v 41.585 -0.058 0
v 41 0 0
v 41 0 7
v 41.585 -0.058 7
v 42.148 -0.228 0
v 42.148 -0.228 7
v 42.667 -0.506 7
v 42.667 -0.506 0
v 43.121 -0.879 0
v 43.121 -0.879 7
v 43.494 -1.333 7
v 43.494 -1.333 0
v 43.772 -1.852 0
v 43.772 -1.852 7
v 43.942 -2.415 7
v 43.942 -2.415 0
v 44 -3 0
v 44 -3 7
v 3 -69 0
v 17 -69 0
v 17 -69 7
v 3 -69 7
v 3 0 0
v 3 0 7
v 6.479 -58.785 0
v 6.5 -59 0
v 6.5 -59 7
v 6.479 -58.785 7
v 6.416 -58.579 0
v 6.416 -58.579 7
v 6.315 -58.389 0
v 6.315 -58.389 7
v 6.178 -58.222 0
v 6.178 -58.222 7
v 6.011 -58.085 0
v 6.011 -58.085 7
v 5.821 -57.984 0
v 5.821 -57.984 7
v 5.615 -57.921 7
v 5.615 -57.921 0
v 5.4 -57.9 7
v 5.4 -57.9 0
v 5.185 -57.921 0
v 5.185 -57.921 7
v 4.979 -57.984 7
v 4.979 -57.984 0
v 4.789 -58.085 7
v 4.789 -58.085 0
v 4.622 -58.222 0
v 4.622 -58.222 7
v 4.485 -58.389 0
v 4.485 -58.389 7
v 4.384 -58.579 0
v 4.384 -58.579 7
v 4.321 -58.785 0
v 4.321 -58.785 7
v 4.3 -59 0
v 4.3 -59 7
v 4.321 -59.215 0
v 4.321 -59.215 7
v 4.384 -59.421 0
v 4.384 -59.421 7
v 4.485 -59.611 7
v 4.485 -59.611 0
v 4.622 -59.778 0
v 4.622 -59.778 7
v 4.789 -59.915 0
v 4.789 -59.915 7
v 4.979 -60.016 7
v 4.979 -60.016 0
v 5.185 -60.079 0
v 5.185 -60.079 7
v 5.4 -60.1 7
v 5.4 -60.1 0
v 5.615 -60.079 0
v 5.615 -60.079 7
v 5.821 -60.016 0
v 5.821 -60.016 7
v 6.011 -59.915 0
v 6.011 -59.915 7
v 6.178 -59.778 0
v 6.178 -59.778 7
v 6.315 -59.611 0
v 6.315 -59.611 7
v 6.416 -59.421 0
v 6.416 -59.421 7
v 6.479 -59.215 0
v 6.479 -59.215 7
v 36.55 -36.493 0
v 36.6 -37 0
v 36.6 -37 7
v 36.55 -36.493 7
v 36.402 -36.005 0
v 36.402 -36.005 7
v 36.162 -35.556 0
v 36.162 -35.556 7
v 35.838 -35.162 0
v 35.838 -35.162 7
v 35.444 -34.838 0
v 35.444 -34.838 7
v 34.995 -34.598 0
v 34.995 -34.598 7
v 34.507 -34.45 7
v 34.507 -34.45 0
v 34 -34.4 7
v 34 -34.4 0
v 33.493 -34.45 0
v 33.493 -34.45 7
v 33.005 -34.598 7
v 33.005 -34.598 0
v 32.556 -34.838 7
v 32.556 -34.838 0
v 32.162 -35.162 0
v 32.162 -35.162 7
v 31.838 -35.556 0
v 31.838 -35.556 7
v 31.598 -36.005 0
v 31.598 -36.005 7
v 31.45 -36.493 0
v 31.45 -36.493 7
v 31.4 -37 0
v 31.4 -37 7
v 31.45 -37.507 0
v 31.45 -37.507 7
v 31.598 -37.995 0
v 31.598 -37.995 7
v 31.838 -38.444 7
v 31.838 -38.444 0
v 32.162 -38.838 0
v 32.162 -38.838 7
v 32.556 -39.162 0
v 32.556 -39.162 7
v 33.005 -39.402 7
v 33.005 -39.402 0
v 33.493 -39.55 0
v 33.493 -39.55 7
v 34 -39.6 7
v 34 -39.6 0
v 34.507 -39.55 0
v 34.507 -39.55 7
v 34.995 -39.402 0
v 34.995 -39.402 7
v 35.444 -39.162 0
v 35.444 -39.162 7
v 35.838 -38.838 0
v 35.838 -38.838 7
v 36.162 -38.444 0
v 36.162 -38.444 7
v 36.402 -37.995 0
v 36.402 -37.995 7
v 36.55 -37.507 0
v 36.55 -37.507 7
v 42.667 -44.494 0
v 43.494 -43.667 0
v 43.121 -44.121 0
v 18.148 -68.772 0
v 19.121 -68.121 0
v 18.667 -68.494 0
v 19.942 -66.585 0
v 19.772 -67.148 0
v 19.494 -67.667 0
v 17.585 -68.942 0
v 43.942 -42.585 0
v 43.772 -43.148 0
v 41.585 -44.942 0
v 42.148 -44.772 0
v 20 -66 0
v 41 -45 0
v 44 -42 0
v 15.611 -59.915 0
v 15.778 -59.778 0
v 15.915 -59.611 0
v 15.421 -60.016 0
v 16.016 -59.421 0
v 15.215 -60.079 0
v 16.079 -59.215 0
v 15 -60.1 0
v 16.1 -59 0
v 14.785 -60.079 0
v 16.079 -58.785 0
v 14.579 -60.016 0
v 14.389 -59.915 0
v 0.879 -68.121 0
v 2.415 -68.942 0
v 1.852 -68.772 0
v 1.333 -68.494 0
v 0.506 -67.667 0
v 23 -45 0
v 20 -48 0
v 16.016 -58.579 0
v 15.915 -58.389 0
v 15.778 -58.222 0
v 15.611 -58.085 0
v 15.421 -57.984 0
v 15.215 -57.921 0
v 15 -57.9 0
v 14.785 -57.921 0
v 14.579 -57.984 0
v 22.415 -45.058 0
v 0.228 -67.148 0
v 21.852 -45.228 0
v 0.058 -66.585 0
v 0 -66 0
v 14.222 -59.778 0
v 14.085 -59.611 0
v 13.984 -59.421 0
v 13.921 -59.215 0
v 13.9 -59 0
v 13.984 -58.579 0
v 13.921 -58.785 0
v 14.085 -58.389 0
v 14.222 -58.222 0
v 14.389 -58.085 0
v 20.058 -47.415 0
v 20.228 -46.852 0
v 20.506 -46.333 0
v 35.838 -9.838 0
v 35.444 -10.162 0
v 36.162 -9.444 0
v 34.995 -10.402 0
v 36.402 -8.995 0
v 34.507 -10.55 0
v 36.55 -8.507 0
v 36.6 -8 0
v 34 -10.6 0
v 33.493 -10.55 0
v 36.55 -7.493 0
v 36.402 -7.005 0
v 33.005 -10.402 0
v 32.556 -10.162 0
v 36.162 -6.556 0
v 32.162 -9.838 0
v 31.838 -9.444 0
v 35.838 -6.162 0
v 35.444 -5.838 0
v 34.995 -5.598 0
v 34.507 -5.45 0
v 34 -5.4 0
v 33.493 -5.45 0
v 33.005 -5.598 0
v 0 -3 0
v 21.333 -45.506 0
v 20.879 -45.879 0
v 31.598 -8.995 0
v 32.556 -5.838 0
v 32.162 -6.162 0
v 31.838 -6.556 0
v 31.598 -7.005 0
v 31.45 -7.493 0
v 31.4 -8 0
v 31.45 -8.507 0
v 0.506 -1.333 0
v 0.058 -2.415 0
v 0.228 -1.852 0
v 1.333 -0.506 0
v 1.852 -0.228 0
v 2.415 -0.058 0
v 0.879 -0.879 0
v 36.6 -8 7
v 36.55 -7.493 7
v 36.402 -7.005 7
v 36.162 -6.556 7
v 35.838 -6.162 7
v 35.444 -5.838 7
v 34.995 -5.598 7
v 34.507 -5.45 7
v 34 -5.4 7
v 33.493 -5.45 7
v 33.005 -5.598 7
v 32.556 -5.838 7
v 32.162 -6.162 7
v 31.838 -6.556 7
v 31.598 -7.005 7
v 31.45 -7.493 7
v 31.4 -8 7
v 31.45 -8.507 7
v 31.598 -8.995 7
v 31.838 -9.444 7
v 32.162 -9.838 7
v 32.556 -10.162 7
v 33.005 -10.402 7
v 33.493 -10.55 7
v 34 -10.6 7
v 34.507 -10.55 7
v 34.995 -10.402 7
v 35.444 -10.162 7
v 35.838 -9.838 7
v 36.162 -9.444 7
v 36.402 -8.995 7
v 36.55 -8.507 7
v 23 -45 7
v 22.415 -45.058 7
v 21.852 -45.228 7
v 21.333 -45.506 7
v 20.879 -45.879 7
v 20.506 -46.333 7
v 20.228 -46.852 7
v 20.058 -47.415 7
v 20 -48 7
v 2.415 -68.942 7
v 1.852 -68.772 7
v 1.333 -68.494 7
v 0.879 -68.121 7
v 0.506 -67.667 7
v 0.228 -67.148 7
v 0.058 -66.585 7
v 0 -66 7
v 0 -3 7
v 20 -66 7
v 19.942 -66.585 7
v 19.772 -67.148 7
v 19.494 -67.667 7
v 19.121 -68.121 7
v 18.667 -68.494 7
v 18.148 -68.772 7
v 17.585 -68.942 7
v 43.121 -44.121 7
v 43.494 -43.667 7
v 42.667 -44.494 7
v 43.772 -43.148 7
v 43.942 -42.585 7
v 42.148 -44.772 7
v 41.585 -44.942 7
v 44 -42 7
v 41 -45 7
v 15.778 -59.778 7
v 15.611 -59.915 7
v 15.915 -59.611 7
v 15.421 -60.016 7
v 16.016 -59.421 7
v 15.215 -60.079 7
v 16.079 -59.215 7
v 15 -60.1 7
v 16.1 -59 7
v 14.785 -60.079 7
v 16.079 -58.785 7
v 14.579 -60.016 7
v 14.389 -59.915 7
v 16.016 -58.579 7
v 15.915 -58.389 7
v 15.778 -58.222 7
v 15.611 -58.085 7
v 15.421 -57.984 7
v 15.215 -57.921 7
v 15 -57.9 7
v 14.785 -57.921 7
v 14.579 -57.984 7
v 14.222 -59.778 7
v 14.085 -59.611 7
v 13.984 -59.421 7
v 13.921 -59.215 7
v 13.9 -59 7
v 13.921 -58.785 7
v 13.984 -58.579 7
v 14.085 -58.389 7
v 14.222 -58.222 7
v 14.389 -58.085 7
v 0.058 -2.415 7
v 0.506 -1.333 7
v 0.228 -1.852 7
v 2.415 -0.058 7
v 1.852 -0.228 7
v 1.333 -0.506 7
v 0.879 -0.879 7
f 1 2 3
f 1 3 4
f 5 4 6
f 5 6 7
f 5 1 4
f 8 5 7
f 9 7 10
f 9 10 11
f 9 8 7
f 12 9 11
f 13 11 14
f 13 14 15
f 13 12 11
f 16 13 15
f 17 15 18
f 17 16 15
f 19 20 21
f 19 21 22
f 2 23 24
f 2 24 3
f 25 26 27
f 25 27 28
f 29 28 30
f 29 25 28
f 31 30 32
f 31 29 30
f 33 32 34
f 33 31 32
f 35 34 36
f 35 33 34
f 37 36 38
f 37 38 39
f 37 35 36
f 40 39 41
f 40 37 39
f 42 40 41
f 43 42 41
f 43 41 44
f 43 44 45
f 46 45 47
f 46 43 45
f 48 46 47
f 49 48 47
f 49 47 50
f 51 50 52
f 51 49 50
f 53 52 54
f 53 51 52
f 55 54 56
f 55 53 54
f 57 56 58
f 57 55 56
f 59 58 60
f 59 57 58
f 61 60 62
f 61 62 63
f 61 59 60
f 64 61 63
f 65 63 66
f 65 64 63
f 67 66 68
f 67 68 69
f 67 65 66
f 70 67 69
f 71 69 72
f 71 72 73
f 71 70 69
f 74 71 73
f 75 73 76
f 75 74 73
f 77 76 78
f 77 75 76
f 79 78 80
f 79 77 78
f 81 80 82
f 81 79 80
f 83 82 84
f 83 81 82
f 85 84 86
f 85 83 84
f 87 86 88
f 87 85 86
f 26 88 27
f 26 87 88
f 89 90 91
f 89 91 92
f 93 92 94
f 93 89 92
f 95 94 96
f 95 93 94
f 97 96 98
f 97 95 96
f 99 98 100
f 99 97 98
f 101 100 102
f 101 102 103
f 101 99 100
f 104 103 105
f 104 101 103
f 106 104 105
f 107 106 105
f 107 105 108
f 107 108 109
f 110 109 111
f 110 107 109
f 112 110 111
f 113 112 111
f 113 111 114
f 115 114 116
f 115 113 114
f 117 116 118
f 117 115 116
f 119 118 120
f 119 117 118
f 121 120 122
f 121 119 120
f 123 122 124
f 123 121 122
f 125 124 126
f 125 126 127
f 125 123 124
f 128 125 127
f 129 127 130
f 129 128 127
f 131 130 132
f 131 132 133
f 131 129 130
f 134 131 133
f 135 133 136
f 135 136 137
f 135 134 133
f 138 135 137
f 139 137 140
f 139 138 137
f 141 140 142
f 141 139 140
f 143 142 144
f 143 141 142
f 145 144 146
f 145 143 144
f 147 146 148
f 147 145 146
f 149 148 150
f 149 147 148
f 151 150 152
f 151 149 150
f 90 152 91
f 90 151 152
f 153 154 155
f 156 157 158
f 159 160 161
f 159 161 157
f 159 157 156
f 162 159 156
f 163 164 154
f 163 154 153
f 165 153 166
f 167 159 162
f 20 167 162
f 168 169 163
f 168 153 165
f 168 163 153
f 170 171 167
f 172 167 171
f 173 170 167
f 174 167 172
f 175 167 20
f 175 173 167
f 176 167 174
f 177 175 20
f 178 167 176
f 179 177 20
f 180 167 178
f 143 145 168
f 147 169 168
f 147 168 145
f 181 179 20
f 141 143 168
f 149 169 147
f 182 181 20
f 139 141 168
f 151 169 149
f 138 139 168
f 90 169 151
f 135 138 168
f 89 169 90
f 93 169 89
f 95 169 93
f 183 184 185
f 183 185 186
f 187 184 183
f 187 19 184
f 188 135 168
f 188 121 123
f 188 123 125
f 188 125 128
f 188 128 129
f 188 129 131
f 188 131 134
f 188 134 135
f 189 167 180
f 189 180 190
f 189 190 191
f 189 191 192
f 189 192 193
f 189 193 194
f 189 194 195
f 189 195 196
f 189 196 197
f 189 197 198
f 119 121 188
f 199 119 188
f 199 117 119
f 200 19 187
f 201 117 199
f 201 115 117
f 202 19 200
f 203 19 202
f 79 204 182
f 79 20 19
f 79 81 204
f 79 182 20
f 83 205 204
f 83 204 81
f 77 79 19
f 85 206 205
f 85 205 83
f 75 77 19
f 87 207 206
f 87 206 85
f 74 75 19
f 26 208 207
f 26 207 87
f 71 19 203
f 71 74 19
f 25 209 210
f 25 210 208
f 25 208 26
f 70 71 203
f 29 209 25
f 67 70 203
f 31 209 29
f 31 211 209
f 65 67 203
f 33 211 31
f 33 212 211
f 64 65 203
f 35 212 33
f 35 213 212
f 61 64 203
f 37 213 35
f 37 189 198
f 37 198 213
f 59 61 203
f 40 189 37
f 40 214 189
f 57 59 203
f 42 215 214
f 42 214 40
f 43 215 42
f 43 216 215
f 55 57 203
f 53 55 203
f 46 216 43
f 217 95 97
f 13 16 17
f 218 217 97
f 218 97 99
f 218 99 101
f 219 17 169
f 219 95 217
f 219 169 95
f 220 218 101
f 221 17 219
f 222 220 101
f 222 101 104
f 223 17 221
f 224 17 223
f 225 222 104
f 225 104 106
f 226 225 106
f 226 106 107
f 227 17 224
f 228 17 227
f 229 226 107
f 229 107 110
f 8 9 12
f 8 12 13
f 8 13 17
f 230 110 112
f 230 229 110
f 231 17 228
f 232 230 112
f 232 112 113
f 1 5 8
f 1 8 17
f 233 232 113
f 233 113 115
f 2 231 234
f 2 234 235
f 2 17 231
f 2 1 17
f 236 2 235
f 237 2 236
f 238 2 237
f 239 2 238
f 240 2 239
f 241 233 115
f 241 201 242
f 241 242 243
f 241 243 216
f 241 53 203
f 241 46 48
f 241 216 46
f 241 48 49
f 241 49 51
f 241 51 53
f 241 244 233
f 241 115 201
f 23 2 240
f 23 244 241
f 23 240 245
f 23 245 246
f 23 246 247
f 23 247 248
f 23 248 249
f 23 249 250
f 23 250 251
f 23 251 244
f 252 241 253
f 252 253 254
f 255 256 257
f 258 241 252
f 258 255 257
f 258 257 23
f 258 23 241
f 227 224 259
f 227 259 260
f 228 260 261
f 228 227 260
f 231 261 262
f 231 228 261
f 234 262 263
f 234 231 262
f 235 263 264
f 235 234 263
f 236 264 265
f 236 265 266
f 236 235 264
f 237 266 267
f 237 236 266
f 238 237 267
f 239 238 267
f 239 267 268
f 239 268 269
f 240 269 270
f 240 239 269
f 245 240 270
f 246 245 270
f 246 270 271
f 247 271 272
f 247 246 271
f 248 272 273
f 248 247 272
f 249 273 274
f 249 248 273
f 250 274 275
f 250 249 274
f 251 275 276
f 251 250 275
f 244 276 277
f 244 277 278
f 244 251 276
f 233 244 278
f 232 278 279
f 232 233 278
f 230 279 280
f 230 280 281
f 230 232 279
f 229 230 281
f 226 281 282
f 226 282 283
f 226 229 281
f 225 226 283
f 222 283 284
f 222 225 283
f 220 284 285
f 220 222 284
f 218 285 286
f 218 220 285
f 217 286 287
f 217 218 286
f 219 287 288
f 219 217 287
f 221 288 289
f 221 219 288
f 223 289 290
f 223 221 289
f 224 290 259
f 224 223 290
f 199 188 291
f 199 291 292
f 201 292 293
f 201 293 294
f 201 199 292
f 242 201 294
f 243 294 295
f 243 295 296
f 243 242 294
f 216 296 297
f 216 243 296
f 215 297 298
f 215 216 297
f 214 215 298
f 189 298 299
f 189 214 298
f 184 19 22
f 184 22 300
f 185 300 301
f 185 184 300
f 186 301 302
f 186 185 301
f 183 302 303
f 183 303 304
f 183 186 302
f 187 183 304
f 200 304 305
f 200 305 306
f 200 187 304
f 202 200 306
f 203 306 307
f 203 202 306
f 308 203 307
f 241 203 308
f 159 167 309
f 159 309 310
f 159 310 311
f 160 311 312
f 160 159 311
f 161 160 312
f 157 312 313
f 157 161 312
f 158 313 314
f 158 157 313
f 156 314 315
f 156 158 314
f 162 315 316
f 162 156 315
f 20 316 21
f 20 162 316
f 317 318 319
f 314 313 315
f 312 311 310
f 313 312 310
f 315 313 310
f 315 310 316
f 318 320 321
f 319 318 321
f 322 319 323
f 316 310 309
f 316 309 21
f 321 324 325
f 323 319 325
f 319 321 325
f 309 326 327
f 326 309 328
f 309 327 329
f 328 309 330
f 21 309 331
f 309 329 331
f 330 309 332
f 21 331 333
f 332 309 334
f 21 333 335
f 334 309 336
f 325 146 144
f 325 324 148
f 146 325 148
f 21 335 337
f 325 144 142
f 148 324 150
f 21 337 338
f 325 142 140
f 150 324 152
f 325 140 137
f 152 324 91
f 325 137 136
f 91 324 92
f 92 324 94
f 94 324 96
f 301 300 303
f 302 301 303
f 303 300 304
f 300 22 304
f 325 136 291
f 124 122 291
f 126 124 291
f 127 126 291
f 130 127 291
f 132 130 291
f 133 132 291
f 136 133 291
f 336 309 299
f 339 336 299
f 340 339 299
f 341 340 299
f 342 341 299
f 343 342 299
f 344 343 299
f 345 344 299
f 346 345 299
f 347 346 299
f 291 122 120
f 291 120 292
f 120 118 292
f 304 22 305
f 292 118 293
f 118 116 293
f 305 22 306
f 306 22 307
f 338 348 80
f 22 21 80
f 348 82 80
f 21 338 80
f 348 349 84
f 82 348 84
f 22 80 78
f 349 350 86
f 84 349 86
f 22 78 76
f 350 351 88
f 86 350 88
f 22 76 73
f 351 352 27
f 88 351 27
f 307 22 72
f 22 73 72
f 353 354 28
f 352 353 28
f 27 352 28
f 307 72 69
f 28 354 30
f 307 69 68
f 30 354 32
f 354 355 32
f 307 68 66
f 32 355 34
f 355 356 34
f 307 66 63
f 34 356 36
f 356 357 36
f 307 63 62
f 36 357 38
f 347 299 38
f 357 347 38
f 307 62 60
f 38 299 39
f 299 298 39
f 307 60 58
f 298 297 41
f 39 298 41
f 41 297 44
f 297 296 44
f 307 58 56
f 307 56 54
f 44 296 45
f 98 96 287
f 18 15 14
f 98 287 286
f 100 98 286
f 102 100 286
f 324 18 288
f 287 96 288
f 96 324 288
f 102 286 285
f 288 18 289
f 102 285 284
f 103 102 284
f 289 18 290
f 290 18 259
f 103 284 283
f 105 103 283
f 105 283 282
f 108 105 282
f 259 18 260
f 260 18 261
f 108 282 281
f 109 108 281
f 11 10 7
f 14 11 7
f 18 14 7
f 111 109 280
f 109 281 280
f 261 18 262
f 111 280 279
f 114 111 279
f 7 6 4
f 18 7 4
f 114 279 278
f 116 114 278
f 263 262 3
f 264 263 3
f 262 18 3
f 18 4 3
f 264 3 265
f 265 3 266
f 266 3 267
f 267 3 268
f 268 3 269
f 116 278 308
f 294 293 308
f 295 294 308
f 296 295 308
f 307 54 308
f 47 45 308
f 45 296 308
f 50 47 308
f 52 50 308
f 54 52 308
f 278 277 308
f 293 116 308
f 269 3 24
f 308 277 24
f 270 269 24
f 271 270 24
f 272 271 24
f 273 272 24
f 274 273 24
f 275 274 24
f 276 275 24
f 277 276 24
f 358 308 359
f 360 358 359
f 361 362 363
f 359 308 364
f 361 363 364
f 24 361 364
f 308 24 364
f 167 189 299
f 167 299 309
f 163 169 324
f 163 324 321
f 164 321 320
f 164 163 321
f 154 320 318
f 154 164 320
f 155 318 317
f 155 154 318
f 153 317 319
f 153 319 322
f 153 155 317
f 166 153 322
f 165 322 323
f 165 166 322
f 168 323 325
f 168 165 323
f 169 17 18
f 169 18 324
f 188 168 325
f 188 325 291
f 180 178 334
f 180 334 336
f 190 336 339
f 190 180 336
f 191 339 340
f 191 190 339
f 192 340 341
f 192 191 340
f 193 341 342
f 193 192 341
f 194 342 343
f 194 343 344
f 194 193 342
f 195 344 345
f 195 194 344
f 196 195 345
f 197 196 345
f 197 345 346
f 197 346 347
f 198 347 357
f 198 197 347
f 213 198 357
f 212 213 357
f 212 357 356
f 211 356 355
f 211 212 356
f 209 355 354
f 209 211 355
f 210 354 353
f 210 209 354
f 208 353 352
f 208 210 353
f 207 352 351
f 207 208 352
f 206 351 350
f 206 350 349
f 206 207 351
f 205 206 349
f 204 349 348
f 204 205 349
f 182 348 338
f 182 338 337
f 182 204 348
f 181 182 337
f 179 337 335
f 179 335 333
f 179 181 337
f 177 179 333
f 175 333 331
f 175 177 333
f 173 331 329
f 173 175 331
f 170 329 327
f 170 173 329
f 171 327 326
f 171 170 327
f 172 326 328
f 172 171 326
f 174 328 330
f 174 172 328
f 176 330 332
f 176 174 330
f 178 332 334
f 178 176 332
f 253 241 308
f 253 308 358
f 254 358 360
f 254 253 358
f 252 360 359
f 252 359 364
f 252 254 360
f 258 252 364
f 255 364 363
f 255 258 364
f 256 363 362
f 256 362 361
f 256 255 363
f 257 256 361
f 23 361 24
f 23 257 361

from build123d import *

# Parameters (mm, degrees)
MODEL_R             = 2.6
MODEL_R_2           = 1.1
BOSS_EXTRUDE1_DEPTH = 7


with BuildPart() as part:
    # Model → Boss-Extrude1 (new body)
    with BuildSketch(Plane.XY):
        with BuildLine():
            Line((3, 0), (41, 0))
            ThreePointArc((41, 0), (43.121320344, -0.878679656), (44, -3))
            Line((44, -3), (44, -42))
            ThreePointArc((44, -42), (43.121320344, -44.121320344), (41, -45))
            Line((41, -45), (23, -45))
            ThreePointArc((23, -45), (20.878679656, -45.878679656), (20, -48))
            Line((20, -48), (20, -66))
            ThreePointArc((20, -66), (19.121320344, -68.121320344), (17, -69))
            Line((17, -69), (3, -69))
            ThreePointArc((3, -69), (0.878679656, -68.121320344), (0, -66))
            Line((0, -66), (0, -3))
            ThreePointArc((0, -3), (0.878679656, -0.878679656), (3, 0))
        make_face()
        with Locations((34, -8)):
            Circle(MODEL_R, mode=Mode.SUBTRACT)
        with Locations((34, -37)):
            Circle(MODEL_R, mode=Mode.SUBTRACT)
        with Locations((5.4, -59)):
            Circle(MODEL_R_2, mode=Mode.SUBTRACT)
        with Locations((15, -59)):
            Circle(MODEL_R_2, mode=Mode.SUBTRACT)
    extrude(amount=BOSS_EXTRUDE1_DEPTH)


solid = part.part
